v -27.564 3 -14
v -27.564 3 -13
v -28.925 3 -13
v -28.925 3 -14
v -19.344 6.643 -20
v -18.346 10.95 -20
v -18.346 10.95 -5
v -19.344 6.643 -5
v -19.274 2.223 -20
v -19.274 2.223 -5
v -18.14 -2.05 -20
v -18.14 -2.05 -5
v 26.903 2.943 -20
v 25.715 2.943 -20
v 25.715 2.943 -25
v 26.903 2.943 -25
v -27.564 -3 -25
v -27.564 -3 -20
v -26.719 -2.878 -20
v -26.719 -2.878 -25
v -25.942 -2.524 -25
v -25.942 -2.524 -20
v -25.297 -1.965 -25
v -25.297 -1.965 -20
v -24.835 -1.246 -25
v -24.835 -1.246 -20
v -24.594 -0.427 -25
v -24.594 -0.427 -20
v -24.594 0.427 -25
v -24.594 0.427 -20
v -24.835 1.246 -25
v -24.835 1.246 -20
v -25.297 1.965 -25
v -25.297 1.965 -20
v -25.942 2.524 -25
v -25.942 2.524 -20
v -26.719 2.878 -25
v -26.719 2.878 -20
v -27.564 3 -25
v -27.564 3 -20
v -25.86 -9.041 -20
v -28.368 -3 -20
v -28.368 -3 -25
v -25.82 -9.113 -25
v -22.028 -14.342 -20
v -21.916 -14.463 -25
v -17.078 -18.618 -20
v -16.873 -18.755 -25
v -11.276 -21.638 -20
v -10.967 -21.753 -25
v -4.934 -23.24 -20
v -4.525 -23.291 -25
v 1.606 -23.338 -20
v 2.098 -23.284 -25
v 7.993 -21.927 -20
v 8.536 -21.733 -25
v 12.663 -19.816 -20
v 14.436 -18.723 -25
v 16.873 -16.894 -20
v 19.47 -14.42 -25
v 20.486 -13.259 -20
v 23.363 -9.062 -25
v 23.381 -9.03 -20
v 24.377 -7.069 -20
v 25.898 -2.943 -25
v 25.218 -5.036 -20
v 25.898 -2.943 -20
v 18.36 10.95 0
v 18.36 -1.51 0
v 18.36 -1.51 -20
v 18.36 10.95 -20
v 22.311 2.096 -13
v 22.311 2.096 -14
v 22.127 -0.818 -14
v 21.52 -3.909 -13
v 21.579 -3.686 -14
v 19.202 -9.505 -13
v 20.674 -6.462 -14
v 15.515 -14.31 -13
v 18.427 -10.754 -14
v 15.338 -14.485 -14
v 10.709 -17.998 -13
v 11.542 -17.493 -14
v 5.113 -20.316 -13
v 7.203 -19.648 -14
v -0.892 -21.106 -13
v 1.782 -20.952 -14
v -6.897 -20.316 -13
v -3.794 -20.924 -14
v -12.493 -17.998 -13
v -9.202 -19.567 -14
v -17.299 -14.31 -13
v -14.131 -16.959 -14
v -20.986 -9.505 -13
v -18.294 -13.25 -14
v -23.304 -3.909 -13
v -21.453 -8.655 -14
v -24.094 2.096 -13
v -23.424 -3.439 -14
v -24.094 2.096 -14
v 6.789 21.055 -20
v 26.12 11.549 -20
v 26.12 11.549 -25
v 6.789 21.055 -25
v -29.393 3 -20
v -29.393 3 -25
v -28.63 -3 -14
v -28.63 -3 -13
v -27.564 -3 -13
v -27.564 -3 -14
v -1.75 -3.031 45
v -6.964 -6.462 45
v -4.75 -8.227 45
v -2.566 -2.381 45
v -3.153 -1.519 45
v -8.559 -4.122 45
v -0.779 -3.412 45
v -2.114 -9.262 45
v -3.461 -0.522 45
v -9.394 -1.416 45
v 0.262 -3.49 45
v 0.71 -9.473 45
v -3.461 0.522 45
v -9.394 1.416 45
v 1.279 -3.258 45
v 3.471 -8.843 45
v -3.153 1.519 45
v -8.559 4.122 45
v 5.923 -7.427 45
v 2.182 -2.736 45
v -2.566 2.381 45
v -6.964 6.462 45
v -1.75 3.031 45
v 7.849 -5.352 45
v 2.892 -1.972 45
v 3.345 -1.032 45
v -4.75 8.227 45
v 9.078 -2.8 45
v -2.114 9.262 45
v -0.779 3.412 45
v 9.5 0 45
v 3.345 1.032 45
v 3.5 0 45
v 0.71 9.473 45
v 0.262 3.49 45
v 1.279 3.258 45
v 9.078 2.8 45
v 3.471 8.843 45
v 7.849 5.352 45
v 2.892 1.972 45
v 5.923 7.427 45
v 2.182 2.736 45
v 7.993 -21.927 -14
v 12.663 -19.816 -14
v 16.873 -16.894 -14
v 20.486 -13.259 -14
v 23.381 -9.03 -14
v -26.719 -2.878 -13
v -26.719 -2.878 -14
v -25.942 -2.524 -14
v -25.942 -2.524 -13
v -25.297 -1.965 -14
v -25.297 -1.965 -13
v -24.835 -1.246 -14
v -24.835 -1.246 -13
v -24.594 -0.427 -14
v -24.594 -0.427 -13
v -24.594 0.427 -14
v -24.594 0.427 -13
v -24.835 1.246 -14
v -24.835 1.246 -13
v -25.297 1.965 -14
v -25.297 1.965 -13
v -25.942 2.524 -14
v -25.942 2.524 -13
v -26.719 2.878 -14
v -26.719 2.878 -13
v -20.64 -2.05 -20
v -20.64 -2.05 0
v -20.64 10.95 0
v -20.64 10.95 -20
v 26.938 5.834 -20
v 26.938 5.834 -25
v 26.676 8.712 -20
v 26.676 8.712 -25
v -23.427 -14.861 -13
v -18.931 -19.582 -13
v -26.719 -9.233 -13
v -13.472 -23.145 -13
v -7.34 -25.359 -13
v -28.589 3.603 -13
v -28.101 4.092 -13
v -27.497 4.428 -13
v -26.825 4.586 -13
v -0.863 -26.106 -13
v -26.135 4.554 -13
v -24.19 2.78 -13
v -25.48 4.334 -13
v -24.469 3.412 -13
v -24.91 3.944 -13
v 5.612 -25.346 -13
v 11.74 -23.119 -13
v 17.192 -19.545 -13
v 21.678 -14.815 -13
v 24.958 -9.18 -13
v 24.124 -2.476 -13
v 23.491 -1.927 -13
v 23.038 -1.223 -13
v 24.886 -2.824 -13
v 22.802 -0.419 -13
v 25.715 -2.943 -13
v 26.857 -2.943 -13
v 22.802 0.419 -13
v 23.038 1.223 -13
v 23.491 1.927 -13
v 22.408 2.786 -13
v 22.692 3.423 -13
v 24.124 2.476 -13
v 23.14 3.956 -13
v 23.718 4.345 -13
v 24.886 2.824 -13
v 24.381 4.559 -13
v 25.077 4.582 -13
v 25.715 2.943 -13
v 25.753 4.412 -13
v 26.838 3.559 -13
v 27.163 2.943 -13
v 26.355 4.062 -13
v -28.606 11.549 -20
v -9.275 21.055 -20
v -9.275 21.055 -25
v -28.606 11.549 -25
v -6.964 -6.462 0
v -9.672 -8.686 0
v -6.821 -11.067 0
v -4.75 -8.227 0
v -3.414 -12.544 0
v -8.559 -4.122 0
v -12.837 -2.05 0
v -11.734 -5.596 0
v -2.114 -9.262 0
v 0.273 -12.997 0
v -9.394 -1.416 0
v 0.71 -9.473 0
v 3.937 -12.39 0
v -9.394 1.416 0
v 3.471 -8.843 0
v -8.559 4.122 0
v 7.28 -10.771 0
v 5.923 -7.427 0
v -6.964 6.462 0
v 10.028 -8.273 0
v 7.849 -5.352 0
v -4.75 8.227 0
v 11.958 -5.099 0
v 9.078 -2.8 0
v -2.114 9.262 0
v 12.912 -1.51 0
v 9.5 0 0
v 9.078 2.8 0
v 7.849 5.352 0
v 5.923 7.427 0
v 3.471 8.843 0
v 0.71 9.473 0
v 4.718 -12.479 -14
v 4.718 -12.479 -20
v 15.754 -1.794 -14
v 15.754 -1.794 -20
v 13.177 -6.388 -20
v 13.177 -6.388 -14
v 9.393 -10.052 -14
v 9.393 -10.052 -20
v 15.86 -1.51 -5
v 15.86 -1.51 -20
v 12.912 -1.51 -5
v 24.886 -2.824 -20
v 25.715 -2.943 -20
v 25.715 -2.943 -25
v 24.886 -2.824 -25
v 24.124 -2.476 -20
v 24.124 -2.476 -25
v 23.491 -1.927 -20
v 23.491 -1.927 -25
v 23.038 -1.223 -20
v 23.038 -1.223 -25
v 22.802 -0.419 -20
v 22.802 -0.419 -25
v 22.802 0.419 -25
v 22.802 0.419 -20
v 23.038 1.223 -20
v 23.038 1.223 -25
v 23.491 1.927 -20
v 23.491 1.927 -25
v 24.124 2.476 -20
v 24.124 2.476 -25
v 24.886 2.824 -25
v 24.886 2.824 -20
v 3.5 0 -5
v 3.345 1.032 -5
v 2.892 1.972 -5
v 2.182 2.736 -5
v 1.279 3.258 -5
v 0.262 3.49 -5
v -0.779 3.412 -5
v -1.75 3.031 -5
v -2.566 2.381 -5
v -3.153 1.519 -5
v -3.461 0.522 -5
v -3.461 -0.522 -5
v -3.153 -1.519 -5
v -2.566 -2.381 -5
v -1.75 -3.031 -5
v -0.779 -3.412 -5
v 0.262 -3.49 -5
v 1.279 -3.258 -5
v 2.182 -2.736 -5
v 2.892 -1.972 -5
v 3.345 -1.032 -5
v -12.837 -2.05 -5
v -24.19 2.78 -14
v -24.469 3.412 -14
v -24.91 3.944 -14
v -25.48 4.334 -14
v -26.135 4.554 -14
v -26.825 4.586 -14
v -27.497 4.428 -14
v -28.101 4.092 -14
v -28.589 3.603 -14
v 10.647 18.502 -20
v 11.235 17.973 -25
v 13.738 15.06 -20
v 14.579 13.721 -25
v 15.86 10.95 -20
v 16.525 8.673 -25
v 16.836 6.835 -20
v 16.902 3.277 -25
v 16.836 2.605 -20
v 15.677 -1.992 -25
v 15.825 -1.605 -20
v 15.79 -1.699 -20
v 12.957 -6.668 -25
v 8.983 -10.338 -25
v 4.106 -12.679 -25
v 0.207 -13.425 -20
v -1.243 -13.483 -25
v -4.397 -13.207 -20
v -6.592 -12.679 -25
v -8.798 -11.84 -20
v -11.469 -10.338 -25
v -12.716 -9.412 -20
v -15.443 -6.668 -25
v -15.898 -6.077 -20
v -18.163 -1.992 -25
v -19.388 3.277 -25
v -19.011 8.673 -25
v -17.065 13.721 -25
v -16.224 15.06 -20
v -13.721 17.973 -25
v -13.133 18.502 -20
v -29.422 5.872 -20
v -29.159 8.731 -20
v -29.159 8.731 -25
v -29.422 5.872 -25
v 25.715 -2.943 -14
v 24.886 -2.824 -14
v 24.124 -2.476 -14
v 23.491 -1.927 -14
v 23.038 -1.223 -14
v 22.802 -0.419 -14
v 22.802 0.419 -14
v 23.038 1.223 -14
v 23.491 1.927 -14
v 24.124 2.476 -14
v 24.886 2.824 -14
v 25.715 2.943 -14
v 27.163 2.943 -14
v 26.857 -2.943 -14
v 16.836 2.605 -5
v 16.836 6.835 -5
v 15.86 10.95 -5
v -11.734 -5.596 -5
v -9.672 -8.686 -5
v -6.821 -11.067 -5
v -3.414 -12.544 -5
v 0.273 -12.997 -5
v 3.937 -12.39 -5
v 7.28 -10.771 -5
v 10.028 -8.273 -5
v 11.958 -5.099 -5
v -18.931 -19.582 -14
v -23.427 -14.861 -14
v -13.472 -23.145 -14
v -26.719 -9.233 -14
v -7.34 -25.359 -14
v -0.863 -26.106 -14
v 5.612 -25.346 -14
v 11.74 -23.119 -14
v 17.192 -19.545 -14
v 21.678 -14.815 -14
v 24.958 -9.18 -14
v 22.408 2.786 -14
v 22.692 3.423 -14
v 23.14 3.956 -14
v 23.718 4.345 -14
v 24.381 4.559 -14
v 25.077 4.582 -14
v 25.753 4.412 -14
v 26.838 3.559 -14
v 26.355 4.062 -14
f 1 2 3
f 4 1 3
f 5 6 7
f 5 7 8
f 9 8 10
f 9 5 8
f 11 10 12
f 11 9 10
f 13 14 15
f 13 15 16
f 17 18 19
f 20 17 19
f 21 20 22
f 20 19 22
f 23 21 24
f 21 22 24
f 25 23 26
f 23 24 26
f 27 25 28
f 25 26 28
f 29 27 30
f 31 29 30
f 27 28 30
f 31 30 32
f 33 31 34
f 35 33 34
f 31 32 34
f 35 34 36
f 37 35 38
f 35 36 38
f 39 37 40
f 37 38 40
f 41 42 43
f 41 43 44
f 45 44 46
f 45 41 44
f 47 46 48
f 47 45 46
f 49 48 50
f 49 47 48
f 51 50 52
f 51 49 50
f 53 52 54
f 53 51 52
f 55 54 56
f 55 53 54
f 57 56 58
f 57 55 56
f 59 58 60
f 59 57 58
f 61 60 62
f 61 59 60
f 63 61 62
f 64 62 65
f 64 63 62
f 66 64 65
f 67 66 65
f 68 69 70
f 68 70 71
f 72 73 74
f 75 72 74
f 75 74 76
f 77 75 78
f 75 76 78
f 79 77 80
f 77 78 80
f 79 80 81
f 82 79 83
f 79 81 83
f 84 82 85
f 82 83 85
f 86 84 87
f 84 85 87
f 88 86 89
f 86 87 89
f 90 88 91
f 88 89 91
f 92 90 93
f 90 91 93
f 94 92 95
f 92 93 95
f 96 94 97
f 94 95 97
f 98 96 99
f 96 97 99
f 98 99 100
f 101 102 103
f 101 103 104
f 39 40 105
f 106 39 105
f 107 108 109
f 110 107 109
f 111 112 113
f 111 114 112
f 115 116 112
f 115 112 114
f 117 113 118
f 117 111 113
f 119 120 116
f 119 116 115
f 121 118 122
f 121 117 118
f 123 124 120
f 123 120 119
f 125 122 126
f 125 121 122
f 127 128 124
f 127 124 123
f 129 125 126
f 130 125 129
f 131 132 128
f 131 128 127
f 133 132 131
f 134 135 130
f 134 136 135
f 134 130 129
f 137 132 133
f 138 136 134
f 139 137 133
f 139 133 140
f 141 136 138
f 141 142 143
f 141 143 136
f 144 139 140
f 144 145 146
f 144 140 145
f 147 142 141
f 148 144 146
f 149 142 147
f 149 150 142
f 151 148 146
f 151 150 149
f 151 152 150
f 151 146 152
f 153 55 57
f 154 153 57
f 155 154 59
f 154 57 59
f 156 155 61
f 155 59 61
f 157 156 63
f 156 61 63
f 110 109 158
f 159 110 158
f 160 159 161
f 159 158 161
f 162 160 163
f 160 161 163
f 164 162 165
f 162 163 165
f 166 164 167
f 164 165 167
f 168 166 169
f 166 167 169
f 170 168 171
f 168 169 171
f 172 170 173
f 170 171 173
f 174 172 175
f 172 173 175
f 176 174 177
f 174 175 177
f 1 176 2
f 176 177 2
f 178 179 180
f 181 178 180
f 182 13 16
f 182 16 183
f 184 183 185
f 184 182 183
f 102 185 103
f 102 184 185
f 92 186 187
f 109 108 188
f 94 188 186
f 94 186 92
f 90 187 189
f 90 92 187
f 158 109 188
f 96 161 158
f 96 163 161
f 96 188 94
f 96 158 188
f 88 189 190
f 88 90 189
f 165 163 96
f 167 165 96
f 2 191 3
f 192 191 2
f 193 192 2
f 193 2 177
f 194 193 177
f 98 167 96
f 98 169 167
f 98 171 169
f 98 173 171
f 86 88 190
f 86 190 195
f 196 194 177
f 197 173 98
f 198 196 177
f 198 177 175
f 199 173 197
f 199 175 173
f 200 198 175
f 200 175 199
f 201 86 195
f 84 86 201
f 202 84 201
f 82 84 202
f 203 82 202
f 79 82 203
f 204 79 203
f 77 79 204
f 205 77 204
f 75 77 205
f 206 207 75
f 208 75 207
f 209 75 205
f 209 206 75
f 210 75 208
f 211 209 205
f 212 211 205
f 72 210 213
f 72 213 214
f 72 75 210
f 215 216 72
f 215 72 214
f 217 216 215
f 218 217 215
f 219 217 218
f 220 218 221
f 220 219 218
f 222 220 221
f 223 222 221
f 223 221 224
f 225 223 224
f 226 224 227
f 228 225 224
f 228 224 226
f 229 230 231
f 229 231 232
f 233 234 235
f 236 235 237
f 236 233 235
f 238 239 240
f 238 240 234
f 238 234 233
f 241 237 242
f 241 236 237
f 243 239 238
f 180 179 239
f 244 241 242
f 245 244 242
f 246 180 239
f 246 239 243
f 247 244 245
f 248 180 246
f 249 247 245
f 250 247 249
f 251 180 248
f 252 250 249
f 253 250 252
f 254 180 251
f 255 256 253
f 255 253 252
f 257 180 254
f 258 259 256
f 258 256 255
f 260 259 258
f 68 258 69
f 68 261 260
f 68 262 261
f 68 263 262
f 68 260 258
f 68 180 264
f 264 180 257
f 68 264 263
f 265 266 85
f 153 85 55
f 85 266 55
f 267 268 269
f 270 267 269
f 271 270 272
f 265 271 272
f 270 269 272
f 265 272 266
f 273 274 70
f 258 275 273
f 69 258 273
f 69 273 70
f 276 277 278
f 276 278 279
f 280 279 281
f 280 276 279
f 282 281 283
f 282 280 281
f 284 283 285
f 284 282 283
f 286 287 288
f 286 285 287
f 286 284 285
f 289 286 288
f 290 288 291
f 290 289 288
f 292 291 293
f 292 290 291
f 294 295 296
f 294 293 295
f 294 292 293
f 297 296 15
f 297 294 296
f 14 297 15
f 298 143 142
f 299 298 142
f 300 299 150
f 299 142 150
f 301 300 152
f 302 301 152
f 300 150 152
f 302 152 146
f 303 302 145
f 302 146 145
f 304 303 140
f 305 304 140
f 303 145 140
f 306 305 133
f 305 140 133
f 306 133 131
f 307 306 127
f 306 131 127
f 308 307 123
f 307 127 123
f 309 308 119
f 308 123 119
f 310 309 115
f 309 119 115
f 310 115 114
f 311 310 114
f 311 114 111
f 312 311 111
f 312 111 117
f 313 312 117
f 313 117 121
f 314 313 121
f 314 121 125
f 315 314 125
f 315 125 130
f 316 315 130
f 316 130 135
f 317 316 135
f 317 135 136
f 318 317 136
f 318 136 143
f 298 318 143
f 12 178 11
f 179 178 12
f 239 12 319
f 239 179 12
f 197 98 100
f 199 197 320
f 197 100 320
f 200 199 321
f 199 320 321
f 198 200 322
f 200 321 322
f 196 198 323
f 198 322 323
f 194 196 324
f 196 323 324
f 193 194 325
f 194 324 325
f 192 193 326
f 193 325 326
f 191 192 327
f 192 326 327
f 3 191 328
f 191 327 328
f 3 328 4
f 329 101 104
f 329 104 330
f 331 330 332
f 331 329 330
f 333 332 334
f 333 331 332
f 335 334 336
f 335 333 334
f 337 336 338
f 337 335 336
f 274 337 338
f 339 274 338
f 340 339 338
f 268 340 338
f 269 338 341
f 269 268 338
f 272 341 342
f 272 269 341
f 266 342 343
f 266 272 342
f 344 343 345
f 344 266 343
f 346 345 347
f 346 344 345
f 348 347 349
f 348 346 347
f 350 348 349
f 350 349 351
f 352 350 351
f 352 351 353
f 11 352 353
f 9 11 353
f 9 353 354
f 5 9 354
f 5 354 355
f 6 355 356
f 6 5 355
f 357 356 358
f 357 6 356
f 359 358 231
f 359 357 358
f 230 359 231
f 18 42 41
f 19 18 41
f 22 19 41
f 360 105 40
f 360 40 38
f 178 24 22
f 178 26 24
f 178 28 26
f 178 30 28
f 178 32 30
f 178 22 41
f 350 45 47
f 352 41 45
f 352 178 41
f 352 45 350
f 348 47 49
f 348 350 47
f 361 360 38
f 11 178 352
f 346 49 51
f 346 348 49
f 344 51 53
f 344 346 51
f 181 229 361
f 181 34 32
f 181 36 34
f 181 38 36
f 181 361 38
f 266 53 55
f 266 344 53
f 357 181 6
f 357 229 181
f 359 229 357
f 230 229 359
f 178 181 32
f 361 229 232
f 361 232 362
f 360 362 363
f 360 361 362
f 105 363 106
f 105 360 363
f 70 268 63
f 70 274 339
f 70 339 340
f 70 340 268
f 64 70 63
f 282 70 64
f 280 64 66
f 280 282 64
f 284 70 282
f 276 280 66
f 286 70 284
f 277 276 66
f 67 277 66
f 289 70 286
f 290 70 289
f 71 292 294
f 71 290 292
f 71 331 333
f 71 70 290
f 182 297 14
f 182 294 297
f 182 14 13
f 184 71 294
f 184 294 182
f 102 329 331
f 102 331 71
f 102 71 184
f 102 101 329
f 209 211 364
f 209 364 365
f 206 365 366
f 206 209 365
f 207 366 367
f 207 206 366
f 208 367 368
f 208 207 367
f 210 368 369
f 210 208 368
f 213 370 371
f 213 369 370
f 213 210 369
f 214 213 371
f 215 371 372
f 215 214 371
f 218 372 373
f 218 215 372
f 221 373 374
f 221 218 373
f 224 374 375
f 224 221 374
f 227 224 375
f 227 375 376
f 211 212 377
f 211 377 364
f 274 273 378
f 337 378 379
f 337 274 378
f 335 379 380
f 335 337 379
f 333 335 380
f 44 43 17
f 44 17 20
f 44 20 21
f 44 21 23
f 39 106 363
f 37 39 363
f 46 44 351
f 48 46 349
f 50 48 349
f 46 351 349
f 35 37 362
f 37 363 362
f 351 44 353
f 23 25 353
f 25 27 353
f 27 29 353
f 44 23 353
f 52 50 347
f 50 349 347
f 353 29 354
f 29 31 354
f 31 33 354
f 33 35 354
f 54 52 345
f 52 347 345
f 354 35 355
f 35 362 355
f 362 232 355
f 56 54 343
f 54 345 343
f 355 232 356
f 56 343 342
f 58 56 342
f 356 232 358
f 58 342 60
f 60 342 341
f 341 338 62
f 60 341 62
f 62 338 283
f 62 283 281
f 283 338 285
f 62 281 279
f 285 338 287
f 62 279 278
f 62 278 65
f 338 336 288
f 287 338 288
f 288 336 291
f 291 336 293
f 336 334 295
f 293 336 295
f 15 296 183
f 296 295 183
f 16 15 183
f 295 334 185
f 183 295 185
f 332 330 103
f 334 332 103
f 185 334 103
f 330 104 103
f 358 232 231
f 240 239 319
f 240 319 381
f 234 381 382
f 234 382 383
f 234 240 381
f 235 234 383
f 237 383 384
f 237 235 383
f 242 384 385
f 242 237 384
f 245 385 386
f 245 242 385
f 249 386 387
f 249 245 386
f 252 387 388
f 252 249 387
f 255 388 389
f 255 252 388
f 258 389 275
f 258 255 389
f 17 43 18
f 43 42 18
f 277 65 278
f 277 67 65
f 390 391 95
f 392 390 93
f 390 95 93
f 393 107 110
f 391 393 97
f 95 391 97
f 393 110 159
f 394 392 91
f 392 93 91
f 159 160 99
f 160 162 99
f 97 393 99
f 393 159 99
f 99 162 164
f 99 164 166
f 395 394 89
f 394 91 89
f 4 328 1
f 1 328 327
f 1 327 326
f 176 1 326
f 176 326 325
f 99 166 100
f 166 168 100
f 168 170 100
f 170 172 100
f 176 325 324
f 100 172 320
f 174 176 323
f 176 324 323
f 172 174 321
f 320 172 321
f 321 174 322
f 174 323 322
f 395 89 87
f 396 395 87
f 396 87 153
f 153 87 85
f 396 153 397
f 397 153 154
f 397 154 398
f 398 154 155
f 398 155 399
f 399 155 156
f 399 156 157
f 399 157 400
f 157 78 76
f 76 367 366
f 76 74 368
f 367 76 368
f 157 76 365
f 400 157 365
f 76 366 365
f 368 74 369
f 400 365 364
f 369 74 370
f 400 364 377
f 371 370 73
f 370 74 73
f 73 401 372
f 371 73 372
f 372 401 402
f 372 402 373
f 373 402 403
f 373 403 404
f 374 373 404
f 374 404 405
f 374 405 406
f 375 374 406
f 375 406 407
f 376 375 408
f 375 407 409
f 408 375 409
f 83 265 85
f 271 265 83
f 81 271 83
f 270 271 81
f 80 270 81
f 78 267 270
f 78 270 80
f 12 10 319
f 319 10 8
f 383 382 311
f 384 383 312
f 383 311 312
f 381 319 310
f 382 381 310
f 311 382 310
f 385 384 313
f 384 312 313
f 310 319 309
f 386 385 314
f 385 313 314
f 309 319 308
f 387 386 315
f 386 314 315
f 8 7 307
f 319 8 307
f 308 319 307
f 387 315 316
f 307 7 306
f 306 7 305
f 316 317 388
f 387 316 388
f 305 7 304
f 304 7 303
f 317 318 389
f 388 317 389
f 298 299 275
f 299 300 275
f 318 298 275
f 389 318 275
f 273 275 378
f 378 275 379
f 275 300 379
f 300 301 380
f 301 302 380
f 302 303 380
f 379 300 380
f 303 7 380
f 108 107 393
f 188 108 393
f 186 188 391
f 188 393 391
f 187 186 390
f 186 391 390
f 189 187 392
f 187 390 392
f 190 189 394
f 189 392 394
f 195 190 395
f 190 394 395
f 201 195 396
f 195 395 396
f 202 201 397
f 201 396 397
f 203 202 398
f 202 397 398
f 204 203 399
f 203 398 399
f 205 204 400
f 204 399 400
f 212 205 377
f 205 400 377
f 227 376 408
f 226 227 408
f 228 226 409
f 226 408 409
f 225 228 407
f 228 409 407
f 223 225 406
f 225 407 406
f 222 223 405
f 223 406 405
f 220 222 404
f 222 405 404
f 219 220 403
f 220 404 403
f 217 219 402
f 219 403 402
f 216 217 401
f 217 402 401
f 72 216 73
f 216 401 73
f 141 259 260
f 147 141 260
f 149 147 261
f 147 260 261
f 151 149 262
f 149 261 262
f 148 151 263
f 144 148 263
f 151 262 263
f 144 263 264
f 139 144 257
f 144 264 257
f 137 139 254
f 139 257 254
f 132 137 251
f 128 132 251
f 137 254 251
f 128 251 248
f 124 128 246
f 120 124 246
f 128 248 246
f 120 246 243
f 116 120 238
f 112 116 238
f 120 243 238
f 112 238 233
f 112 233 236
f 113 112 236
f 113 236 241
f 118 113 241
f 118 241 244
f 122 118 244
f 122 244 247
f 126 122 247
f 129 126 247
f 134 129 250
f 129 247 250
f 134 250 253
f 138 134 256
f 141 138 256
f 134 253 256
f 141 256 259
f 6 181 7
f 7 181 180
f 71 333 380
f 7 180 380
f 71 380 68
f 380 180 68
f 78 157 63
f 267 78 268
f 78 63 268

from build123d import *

# Parameters (mm, degrees)
CROQUIS1_R              = 9.5
SALIENTE_EXTRUIR1_DEPTH = 45
SALIENTE_EXTRUIR2_DEPTH = 5
CROQUIS3_W              = 2.5
CROQUIS3_H              = 12.459614936
CROQUIS3_H_2            = 13
SALIENTE_EXTRUIR3_DEPTH = 20
SALIENTE_EXTRUIR4_DEPTH = 5
CORTAR_EXTRUIR1_DEPTH   = 15
CORTAR_EXTRUIR2_DEPTH   = 15
SALIENTE_EXTRUIR6_DEPTH = 6
SALIENTE_EXTRUIR9_DEPTH = 1
CORTAR_EXTRUIR3_DEPTH   = 30
CORTAR_EXTRUIR4_DEPTH   = 30
CROQUIS14_R             = 3.5
CORTAR_EXTRUIR5_DEPTH   = 71


with BuildPart() as part:
    # Croquis1 → Saliente-Extruir1 (new body)
    with BuildSketch(Plane.XY):
        Circle(CROQUIS1_R)
    extrude(amount=SALIENTE_EXTRUIR1_DEPTH)

    # Croquis2 → Saliente-Extruir2 (add)
    with BuildSketch(Plane(origin=(0, 0, 0), x_dir=(-1, 0, 0), z_dir=(0, 0, -1))):
        with BuildLine():
            Line((-13.86026331, 10.949878275), (16.13973669, 10.949878275))
            Line((16.13973669, 10.949878275), (18.13973669, 10.949878275))
            Line((18.13973669, 10.949878275), (18.13973669, -2.050121725))
            Line((18.13973669, -2.050121725), (12.837328418, -2.050121725))
            ThreePointArc((12.837328418, -2.050121725), (-0.272762426, -12.997138172), (-12.912036834, -1.509736661))
            Line((-12.912036834, -1.509736661), (-15.86026331, -1.509736661))
            Line((-15.86026331, -1.509736661), (-15.86026331, 10.949878275))
            Line((-15.86026331, 10.949878275), (-13.86026331, 10.949878275))
        make_face()
    extrude(amount=SALIENTE_EXTRUIR2_DEPTH)

    # Croquis3 → Saliente-Extruir3 (add)
    with BuildSketch(Plane.XY):
        with Locations((17.11026331, 4.720070807)):
            Rectangle(CROQUIS3_W, CROQUIS3_H)
        with Locations((-19.38973669, 4.449878275)):
            Rectangle(CROQUIS3_W, CROQUIS3_H_2)
    extrude(amount=-SALIENTE_EXTRUIR3_DEPTH)

    # Croquis4 → Saliente-Extruir4 (add)
    with BuildSketch(Plane(origin=(0, 0, -20), x_dir=(-1, 0, 0), z_dir=(0, 0, -1))):
        with BuildLine():
            Line((-26.12024366, 11.549093047), (-6.789040969, 21.054674019))
            ThreePointArc((-6.789040969, 21.054674019), (1.243045599, -13.482502548), (9.275132167, 21.054674019))
            Line((9.275132167, 21.054674019), (28.606334858, 11.549093047))
            ThreePointArc((28.606334858, 11.549093047), (1.243045599, -23.482502548), (-26.12024366, 11.549093047))
        make_face()
    extrude(amount=SALIENTE_EXTRUIR4_DEPTH)

    # Croquis5 → Cortar-Extruir1 (cut)
    with BuildSketch(Plane(origin=(0, 0, -20), x_dir=(-1, 0, 0), z_dir=(0, 0, -1))):
        with BuildLine():
            Line((-15.86026331, 10.949878275), (-15.86026331, -1.509736661))
            ThreePointArc((-15.86026331, -1.509736661), (-16.959527756, 4.720070807), (-15.86026331, 10.949878275))
        make_face()
    extrude(amount=-CORTAR_EXTRUIR1_DEPTH, mode=Mode.SUBTRACT)

    # Croquis6 → Cortar-Extruir2 (cut)
    with BuildSketch(Plane(origin=(0, 0, -20), x_dir=(-1, 0, 0), z_dir=(0, 0, -1))):
        with BuildLine():
            Line((18.13973669, -2.050121725), (18.13973669, 10.949878275))
            Line((18.13973669, 10.949878275), (18.346354508, 10.949878275))
            ThreePointArc((18.346354508, 10.949878275), (19.443320322, 4.430801495), (18.13973669, -2.050121725))
        make_face()
    extrude(amount=-CORTAR_EXTRUIR2_DEPTH, mode=Mode.SUBTRACT)

    # Croquis8 → Saliente-Extruir6 (add)
    with BuildSketch(Plane.XY.offset(-20)):
        with BuildLine():
            Line((23.380531683, -9.030005034), (15.754093987, -1.793831452))
            ThreePointArc((15.754093987, -1.793831452), (11.418506022, -8.357344354), (4.718355695, -12.478631799))
            Line((4.718355695, -12.478631799), (7.993387845, -21.927132443))
            ThreePointArc((7.993387845, -21.927132443), (16.873495336, -16.894185793), (23.380531683, -9.030005034))
        make_face()
    extrude(amount=SALIENTE_EXTRUIR6_DEPTH)

    # Croquis10 → Saliente-Extruir9 (add)
    with BuildSketch(Plane.XY.offset(-14)):
        with BuildLine():
            ThreePointArc((-29.094443415, 2.096360018), (-0.89187006, -26.106213336), (27.310703295, 2.096360018))
            ThreePointArc((27.310703295, 2.096360018), (24.810703295, 4.596360018), (22.310703295, 2.096360018))
            ThreePointArc((22.310703295, 2.096360018), (-0.89187006, -21.106213336), (-24.094443415, 2.096360018))
            ThreePointArc((-24.094443415, 2.096360018), (-26.594443415, 4.596360018), (-29.094443415, 2.096360018))
        make_face()
    extrude(amount=SALIENTE_EXTRUIR9_DEPTH)

    # Croquis12 → Cortar-Extruir3 (cut)
    with BuildSketch(Plane.XY.offset(-13)):
        with BuildLine():
            Line((-27.563915972, 3), (-28.925416341, 3))
            Line((-28.925416341, 3), (-33.584272261, 3))
            Line((-33.584272261, 3), (-33.584272261, -3))
            Line((-33.584272261, -3), (-28.63015152, -3))
            Line((-28.63015152, -3), (-27.563915972, -3))
            ThreePointArc((-27.563915972, -3), (-24.563915972, 0), (-27.563915972, 3))
        make_face()
    extrude(amount=-CORTAR_EXTRUIR3_DEPTH, mode=Mode.SUBTRACT)

    # Croquis13 → Cortar-Extruir4 (cut)
    with BuildSketch(Plane.XY.offset(-13)):
        with BuildLine():
            Line((25.714967949, 2.943204688), (33.854636773, 2.943204688))
            Line((33.854636773, 2.943204688), (33.854636773, -2.943204688))
            Line((33.854636773, -2.943204688), (25.714967949, -2.943204688))
            ThreePointArc((25.714967949, -2.943204688), (22.771763261, 0), (25.714967949, 2.943204688))
        make_face()
    extrude(amount=-CORTAR_EXTRUIR4_DEPTH, mode=Mode.SUBTRACT)

    # Croquis14 → Cortar-Extruir5 (cut, through all)
    with BuildSketch(Plane.XY.offset(45)):
        Circle(CROQUIS14_R)
    extrude(amount=-CORTAR_EXTRUIR5_DEPTH, mode=Mode.SUBTRACT)


solid = part.part
